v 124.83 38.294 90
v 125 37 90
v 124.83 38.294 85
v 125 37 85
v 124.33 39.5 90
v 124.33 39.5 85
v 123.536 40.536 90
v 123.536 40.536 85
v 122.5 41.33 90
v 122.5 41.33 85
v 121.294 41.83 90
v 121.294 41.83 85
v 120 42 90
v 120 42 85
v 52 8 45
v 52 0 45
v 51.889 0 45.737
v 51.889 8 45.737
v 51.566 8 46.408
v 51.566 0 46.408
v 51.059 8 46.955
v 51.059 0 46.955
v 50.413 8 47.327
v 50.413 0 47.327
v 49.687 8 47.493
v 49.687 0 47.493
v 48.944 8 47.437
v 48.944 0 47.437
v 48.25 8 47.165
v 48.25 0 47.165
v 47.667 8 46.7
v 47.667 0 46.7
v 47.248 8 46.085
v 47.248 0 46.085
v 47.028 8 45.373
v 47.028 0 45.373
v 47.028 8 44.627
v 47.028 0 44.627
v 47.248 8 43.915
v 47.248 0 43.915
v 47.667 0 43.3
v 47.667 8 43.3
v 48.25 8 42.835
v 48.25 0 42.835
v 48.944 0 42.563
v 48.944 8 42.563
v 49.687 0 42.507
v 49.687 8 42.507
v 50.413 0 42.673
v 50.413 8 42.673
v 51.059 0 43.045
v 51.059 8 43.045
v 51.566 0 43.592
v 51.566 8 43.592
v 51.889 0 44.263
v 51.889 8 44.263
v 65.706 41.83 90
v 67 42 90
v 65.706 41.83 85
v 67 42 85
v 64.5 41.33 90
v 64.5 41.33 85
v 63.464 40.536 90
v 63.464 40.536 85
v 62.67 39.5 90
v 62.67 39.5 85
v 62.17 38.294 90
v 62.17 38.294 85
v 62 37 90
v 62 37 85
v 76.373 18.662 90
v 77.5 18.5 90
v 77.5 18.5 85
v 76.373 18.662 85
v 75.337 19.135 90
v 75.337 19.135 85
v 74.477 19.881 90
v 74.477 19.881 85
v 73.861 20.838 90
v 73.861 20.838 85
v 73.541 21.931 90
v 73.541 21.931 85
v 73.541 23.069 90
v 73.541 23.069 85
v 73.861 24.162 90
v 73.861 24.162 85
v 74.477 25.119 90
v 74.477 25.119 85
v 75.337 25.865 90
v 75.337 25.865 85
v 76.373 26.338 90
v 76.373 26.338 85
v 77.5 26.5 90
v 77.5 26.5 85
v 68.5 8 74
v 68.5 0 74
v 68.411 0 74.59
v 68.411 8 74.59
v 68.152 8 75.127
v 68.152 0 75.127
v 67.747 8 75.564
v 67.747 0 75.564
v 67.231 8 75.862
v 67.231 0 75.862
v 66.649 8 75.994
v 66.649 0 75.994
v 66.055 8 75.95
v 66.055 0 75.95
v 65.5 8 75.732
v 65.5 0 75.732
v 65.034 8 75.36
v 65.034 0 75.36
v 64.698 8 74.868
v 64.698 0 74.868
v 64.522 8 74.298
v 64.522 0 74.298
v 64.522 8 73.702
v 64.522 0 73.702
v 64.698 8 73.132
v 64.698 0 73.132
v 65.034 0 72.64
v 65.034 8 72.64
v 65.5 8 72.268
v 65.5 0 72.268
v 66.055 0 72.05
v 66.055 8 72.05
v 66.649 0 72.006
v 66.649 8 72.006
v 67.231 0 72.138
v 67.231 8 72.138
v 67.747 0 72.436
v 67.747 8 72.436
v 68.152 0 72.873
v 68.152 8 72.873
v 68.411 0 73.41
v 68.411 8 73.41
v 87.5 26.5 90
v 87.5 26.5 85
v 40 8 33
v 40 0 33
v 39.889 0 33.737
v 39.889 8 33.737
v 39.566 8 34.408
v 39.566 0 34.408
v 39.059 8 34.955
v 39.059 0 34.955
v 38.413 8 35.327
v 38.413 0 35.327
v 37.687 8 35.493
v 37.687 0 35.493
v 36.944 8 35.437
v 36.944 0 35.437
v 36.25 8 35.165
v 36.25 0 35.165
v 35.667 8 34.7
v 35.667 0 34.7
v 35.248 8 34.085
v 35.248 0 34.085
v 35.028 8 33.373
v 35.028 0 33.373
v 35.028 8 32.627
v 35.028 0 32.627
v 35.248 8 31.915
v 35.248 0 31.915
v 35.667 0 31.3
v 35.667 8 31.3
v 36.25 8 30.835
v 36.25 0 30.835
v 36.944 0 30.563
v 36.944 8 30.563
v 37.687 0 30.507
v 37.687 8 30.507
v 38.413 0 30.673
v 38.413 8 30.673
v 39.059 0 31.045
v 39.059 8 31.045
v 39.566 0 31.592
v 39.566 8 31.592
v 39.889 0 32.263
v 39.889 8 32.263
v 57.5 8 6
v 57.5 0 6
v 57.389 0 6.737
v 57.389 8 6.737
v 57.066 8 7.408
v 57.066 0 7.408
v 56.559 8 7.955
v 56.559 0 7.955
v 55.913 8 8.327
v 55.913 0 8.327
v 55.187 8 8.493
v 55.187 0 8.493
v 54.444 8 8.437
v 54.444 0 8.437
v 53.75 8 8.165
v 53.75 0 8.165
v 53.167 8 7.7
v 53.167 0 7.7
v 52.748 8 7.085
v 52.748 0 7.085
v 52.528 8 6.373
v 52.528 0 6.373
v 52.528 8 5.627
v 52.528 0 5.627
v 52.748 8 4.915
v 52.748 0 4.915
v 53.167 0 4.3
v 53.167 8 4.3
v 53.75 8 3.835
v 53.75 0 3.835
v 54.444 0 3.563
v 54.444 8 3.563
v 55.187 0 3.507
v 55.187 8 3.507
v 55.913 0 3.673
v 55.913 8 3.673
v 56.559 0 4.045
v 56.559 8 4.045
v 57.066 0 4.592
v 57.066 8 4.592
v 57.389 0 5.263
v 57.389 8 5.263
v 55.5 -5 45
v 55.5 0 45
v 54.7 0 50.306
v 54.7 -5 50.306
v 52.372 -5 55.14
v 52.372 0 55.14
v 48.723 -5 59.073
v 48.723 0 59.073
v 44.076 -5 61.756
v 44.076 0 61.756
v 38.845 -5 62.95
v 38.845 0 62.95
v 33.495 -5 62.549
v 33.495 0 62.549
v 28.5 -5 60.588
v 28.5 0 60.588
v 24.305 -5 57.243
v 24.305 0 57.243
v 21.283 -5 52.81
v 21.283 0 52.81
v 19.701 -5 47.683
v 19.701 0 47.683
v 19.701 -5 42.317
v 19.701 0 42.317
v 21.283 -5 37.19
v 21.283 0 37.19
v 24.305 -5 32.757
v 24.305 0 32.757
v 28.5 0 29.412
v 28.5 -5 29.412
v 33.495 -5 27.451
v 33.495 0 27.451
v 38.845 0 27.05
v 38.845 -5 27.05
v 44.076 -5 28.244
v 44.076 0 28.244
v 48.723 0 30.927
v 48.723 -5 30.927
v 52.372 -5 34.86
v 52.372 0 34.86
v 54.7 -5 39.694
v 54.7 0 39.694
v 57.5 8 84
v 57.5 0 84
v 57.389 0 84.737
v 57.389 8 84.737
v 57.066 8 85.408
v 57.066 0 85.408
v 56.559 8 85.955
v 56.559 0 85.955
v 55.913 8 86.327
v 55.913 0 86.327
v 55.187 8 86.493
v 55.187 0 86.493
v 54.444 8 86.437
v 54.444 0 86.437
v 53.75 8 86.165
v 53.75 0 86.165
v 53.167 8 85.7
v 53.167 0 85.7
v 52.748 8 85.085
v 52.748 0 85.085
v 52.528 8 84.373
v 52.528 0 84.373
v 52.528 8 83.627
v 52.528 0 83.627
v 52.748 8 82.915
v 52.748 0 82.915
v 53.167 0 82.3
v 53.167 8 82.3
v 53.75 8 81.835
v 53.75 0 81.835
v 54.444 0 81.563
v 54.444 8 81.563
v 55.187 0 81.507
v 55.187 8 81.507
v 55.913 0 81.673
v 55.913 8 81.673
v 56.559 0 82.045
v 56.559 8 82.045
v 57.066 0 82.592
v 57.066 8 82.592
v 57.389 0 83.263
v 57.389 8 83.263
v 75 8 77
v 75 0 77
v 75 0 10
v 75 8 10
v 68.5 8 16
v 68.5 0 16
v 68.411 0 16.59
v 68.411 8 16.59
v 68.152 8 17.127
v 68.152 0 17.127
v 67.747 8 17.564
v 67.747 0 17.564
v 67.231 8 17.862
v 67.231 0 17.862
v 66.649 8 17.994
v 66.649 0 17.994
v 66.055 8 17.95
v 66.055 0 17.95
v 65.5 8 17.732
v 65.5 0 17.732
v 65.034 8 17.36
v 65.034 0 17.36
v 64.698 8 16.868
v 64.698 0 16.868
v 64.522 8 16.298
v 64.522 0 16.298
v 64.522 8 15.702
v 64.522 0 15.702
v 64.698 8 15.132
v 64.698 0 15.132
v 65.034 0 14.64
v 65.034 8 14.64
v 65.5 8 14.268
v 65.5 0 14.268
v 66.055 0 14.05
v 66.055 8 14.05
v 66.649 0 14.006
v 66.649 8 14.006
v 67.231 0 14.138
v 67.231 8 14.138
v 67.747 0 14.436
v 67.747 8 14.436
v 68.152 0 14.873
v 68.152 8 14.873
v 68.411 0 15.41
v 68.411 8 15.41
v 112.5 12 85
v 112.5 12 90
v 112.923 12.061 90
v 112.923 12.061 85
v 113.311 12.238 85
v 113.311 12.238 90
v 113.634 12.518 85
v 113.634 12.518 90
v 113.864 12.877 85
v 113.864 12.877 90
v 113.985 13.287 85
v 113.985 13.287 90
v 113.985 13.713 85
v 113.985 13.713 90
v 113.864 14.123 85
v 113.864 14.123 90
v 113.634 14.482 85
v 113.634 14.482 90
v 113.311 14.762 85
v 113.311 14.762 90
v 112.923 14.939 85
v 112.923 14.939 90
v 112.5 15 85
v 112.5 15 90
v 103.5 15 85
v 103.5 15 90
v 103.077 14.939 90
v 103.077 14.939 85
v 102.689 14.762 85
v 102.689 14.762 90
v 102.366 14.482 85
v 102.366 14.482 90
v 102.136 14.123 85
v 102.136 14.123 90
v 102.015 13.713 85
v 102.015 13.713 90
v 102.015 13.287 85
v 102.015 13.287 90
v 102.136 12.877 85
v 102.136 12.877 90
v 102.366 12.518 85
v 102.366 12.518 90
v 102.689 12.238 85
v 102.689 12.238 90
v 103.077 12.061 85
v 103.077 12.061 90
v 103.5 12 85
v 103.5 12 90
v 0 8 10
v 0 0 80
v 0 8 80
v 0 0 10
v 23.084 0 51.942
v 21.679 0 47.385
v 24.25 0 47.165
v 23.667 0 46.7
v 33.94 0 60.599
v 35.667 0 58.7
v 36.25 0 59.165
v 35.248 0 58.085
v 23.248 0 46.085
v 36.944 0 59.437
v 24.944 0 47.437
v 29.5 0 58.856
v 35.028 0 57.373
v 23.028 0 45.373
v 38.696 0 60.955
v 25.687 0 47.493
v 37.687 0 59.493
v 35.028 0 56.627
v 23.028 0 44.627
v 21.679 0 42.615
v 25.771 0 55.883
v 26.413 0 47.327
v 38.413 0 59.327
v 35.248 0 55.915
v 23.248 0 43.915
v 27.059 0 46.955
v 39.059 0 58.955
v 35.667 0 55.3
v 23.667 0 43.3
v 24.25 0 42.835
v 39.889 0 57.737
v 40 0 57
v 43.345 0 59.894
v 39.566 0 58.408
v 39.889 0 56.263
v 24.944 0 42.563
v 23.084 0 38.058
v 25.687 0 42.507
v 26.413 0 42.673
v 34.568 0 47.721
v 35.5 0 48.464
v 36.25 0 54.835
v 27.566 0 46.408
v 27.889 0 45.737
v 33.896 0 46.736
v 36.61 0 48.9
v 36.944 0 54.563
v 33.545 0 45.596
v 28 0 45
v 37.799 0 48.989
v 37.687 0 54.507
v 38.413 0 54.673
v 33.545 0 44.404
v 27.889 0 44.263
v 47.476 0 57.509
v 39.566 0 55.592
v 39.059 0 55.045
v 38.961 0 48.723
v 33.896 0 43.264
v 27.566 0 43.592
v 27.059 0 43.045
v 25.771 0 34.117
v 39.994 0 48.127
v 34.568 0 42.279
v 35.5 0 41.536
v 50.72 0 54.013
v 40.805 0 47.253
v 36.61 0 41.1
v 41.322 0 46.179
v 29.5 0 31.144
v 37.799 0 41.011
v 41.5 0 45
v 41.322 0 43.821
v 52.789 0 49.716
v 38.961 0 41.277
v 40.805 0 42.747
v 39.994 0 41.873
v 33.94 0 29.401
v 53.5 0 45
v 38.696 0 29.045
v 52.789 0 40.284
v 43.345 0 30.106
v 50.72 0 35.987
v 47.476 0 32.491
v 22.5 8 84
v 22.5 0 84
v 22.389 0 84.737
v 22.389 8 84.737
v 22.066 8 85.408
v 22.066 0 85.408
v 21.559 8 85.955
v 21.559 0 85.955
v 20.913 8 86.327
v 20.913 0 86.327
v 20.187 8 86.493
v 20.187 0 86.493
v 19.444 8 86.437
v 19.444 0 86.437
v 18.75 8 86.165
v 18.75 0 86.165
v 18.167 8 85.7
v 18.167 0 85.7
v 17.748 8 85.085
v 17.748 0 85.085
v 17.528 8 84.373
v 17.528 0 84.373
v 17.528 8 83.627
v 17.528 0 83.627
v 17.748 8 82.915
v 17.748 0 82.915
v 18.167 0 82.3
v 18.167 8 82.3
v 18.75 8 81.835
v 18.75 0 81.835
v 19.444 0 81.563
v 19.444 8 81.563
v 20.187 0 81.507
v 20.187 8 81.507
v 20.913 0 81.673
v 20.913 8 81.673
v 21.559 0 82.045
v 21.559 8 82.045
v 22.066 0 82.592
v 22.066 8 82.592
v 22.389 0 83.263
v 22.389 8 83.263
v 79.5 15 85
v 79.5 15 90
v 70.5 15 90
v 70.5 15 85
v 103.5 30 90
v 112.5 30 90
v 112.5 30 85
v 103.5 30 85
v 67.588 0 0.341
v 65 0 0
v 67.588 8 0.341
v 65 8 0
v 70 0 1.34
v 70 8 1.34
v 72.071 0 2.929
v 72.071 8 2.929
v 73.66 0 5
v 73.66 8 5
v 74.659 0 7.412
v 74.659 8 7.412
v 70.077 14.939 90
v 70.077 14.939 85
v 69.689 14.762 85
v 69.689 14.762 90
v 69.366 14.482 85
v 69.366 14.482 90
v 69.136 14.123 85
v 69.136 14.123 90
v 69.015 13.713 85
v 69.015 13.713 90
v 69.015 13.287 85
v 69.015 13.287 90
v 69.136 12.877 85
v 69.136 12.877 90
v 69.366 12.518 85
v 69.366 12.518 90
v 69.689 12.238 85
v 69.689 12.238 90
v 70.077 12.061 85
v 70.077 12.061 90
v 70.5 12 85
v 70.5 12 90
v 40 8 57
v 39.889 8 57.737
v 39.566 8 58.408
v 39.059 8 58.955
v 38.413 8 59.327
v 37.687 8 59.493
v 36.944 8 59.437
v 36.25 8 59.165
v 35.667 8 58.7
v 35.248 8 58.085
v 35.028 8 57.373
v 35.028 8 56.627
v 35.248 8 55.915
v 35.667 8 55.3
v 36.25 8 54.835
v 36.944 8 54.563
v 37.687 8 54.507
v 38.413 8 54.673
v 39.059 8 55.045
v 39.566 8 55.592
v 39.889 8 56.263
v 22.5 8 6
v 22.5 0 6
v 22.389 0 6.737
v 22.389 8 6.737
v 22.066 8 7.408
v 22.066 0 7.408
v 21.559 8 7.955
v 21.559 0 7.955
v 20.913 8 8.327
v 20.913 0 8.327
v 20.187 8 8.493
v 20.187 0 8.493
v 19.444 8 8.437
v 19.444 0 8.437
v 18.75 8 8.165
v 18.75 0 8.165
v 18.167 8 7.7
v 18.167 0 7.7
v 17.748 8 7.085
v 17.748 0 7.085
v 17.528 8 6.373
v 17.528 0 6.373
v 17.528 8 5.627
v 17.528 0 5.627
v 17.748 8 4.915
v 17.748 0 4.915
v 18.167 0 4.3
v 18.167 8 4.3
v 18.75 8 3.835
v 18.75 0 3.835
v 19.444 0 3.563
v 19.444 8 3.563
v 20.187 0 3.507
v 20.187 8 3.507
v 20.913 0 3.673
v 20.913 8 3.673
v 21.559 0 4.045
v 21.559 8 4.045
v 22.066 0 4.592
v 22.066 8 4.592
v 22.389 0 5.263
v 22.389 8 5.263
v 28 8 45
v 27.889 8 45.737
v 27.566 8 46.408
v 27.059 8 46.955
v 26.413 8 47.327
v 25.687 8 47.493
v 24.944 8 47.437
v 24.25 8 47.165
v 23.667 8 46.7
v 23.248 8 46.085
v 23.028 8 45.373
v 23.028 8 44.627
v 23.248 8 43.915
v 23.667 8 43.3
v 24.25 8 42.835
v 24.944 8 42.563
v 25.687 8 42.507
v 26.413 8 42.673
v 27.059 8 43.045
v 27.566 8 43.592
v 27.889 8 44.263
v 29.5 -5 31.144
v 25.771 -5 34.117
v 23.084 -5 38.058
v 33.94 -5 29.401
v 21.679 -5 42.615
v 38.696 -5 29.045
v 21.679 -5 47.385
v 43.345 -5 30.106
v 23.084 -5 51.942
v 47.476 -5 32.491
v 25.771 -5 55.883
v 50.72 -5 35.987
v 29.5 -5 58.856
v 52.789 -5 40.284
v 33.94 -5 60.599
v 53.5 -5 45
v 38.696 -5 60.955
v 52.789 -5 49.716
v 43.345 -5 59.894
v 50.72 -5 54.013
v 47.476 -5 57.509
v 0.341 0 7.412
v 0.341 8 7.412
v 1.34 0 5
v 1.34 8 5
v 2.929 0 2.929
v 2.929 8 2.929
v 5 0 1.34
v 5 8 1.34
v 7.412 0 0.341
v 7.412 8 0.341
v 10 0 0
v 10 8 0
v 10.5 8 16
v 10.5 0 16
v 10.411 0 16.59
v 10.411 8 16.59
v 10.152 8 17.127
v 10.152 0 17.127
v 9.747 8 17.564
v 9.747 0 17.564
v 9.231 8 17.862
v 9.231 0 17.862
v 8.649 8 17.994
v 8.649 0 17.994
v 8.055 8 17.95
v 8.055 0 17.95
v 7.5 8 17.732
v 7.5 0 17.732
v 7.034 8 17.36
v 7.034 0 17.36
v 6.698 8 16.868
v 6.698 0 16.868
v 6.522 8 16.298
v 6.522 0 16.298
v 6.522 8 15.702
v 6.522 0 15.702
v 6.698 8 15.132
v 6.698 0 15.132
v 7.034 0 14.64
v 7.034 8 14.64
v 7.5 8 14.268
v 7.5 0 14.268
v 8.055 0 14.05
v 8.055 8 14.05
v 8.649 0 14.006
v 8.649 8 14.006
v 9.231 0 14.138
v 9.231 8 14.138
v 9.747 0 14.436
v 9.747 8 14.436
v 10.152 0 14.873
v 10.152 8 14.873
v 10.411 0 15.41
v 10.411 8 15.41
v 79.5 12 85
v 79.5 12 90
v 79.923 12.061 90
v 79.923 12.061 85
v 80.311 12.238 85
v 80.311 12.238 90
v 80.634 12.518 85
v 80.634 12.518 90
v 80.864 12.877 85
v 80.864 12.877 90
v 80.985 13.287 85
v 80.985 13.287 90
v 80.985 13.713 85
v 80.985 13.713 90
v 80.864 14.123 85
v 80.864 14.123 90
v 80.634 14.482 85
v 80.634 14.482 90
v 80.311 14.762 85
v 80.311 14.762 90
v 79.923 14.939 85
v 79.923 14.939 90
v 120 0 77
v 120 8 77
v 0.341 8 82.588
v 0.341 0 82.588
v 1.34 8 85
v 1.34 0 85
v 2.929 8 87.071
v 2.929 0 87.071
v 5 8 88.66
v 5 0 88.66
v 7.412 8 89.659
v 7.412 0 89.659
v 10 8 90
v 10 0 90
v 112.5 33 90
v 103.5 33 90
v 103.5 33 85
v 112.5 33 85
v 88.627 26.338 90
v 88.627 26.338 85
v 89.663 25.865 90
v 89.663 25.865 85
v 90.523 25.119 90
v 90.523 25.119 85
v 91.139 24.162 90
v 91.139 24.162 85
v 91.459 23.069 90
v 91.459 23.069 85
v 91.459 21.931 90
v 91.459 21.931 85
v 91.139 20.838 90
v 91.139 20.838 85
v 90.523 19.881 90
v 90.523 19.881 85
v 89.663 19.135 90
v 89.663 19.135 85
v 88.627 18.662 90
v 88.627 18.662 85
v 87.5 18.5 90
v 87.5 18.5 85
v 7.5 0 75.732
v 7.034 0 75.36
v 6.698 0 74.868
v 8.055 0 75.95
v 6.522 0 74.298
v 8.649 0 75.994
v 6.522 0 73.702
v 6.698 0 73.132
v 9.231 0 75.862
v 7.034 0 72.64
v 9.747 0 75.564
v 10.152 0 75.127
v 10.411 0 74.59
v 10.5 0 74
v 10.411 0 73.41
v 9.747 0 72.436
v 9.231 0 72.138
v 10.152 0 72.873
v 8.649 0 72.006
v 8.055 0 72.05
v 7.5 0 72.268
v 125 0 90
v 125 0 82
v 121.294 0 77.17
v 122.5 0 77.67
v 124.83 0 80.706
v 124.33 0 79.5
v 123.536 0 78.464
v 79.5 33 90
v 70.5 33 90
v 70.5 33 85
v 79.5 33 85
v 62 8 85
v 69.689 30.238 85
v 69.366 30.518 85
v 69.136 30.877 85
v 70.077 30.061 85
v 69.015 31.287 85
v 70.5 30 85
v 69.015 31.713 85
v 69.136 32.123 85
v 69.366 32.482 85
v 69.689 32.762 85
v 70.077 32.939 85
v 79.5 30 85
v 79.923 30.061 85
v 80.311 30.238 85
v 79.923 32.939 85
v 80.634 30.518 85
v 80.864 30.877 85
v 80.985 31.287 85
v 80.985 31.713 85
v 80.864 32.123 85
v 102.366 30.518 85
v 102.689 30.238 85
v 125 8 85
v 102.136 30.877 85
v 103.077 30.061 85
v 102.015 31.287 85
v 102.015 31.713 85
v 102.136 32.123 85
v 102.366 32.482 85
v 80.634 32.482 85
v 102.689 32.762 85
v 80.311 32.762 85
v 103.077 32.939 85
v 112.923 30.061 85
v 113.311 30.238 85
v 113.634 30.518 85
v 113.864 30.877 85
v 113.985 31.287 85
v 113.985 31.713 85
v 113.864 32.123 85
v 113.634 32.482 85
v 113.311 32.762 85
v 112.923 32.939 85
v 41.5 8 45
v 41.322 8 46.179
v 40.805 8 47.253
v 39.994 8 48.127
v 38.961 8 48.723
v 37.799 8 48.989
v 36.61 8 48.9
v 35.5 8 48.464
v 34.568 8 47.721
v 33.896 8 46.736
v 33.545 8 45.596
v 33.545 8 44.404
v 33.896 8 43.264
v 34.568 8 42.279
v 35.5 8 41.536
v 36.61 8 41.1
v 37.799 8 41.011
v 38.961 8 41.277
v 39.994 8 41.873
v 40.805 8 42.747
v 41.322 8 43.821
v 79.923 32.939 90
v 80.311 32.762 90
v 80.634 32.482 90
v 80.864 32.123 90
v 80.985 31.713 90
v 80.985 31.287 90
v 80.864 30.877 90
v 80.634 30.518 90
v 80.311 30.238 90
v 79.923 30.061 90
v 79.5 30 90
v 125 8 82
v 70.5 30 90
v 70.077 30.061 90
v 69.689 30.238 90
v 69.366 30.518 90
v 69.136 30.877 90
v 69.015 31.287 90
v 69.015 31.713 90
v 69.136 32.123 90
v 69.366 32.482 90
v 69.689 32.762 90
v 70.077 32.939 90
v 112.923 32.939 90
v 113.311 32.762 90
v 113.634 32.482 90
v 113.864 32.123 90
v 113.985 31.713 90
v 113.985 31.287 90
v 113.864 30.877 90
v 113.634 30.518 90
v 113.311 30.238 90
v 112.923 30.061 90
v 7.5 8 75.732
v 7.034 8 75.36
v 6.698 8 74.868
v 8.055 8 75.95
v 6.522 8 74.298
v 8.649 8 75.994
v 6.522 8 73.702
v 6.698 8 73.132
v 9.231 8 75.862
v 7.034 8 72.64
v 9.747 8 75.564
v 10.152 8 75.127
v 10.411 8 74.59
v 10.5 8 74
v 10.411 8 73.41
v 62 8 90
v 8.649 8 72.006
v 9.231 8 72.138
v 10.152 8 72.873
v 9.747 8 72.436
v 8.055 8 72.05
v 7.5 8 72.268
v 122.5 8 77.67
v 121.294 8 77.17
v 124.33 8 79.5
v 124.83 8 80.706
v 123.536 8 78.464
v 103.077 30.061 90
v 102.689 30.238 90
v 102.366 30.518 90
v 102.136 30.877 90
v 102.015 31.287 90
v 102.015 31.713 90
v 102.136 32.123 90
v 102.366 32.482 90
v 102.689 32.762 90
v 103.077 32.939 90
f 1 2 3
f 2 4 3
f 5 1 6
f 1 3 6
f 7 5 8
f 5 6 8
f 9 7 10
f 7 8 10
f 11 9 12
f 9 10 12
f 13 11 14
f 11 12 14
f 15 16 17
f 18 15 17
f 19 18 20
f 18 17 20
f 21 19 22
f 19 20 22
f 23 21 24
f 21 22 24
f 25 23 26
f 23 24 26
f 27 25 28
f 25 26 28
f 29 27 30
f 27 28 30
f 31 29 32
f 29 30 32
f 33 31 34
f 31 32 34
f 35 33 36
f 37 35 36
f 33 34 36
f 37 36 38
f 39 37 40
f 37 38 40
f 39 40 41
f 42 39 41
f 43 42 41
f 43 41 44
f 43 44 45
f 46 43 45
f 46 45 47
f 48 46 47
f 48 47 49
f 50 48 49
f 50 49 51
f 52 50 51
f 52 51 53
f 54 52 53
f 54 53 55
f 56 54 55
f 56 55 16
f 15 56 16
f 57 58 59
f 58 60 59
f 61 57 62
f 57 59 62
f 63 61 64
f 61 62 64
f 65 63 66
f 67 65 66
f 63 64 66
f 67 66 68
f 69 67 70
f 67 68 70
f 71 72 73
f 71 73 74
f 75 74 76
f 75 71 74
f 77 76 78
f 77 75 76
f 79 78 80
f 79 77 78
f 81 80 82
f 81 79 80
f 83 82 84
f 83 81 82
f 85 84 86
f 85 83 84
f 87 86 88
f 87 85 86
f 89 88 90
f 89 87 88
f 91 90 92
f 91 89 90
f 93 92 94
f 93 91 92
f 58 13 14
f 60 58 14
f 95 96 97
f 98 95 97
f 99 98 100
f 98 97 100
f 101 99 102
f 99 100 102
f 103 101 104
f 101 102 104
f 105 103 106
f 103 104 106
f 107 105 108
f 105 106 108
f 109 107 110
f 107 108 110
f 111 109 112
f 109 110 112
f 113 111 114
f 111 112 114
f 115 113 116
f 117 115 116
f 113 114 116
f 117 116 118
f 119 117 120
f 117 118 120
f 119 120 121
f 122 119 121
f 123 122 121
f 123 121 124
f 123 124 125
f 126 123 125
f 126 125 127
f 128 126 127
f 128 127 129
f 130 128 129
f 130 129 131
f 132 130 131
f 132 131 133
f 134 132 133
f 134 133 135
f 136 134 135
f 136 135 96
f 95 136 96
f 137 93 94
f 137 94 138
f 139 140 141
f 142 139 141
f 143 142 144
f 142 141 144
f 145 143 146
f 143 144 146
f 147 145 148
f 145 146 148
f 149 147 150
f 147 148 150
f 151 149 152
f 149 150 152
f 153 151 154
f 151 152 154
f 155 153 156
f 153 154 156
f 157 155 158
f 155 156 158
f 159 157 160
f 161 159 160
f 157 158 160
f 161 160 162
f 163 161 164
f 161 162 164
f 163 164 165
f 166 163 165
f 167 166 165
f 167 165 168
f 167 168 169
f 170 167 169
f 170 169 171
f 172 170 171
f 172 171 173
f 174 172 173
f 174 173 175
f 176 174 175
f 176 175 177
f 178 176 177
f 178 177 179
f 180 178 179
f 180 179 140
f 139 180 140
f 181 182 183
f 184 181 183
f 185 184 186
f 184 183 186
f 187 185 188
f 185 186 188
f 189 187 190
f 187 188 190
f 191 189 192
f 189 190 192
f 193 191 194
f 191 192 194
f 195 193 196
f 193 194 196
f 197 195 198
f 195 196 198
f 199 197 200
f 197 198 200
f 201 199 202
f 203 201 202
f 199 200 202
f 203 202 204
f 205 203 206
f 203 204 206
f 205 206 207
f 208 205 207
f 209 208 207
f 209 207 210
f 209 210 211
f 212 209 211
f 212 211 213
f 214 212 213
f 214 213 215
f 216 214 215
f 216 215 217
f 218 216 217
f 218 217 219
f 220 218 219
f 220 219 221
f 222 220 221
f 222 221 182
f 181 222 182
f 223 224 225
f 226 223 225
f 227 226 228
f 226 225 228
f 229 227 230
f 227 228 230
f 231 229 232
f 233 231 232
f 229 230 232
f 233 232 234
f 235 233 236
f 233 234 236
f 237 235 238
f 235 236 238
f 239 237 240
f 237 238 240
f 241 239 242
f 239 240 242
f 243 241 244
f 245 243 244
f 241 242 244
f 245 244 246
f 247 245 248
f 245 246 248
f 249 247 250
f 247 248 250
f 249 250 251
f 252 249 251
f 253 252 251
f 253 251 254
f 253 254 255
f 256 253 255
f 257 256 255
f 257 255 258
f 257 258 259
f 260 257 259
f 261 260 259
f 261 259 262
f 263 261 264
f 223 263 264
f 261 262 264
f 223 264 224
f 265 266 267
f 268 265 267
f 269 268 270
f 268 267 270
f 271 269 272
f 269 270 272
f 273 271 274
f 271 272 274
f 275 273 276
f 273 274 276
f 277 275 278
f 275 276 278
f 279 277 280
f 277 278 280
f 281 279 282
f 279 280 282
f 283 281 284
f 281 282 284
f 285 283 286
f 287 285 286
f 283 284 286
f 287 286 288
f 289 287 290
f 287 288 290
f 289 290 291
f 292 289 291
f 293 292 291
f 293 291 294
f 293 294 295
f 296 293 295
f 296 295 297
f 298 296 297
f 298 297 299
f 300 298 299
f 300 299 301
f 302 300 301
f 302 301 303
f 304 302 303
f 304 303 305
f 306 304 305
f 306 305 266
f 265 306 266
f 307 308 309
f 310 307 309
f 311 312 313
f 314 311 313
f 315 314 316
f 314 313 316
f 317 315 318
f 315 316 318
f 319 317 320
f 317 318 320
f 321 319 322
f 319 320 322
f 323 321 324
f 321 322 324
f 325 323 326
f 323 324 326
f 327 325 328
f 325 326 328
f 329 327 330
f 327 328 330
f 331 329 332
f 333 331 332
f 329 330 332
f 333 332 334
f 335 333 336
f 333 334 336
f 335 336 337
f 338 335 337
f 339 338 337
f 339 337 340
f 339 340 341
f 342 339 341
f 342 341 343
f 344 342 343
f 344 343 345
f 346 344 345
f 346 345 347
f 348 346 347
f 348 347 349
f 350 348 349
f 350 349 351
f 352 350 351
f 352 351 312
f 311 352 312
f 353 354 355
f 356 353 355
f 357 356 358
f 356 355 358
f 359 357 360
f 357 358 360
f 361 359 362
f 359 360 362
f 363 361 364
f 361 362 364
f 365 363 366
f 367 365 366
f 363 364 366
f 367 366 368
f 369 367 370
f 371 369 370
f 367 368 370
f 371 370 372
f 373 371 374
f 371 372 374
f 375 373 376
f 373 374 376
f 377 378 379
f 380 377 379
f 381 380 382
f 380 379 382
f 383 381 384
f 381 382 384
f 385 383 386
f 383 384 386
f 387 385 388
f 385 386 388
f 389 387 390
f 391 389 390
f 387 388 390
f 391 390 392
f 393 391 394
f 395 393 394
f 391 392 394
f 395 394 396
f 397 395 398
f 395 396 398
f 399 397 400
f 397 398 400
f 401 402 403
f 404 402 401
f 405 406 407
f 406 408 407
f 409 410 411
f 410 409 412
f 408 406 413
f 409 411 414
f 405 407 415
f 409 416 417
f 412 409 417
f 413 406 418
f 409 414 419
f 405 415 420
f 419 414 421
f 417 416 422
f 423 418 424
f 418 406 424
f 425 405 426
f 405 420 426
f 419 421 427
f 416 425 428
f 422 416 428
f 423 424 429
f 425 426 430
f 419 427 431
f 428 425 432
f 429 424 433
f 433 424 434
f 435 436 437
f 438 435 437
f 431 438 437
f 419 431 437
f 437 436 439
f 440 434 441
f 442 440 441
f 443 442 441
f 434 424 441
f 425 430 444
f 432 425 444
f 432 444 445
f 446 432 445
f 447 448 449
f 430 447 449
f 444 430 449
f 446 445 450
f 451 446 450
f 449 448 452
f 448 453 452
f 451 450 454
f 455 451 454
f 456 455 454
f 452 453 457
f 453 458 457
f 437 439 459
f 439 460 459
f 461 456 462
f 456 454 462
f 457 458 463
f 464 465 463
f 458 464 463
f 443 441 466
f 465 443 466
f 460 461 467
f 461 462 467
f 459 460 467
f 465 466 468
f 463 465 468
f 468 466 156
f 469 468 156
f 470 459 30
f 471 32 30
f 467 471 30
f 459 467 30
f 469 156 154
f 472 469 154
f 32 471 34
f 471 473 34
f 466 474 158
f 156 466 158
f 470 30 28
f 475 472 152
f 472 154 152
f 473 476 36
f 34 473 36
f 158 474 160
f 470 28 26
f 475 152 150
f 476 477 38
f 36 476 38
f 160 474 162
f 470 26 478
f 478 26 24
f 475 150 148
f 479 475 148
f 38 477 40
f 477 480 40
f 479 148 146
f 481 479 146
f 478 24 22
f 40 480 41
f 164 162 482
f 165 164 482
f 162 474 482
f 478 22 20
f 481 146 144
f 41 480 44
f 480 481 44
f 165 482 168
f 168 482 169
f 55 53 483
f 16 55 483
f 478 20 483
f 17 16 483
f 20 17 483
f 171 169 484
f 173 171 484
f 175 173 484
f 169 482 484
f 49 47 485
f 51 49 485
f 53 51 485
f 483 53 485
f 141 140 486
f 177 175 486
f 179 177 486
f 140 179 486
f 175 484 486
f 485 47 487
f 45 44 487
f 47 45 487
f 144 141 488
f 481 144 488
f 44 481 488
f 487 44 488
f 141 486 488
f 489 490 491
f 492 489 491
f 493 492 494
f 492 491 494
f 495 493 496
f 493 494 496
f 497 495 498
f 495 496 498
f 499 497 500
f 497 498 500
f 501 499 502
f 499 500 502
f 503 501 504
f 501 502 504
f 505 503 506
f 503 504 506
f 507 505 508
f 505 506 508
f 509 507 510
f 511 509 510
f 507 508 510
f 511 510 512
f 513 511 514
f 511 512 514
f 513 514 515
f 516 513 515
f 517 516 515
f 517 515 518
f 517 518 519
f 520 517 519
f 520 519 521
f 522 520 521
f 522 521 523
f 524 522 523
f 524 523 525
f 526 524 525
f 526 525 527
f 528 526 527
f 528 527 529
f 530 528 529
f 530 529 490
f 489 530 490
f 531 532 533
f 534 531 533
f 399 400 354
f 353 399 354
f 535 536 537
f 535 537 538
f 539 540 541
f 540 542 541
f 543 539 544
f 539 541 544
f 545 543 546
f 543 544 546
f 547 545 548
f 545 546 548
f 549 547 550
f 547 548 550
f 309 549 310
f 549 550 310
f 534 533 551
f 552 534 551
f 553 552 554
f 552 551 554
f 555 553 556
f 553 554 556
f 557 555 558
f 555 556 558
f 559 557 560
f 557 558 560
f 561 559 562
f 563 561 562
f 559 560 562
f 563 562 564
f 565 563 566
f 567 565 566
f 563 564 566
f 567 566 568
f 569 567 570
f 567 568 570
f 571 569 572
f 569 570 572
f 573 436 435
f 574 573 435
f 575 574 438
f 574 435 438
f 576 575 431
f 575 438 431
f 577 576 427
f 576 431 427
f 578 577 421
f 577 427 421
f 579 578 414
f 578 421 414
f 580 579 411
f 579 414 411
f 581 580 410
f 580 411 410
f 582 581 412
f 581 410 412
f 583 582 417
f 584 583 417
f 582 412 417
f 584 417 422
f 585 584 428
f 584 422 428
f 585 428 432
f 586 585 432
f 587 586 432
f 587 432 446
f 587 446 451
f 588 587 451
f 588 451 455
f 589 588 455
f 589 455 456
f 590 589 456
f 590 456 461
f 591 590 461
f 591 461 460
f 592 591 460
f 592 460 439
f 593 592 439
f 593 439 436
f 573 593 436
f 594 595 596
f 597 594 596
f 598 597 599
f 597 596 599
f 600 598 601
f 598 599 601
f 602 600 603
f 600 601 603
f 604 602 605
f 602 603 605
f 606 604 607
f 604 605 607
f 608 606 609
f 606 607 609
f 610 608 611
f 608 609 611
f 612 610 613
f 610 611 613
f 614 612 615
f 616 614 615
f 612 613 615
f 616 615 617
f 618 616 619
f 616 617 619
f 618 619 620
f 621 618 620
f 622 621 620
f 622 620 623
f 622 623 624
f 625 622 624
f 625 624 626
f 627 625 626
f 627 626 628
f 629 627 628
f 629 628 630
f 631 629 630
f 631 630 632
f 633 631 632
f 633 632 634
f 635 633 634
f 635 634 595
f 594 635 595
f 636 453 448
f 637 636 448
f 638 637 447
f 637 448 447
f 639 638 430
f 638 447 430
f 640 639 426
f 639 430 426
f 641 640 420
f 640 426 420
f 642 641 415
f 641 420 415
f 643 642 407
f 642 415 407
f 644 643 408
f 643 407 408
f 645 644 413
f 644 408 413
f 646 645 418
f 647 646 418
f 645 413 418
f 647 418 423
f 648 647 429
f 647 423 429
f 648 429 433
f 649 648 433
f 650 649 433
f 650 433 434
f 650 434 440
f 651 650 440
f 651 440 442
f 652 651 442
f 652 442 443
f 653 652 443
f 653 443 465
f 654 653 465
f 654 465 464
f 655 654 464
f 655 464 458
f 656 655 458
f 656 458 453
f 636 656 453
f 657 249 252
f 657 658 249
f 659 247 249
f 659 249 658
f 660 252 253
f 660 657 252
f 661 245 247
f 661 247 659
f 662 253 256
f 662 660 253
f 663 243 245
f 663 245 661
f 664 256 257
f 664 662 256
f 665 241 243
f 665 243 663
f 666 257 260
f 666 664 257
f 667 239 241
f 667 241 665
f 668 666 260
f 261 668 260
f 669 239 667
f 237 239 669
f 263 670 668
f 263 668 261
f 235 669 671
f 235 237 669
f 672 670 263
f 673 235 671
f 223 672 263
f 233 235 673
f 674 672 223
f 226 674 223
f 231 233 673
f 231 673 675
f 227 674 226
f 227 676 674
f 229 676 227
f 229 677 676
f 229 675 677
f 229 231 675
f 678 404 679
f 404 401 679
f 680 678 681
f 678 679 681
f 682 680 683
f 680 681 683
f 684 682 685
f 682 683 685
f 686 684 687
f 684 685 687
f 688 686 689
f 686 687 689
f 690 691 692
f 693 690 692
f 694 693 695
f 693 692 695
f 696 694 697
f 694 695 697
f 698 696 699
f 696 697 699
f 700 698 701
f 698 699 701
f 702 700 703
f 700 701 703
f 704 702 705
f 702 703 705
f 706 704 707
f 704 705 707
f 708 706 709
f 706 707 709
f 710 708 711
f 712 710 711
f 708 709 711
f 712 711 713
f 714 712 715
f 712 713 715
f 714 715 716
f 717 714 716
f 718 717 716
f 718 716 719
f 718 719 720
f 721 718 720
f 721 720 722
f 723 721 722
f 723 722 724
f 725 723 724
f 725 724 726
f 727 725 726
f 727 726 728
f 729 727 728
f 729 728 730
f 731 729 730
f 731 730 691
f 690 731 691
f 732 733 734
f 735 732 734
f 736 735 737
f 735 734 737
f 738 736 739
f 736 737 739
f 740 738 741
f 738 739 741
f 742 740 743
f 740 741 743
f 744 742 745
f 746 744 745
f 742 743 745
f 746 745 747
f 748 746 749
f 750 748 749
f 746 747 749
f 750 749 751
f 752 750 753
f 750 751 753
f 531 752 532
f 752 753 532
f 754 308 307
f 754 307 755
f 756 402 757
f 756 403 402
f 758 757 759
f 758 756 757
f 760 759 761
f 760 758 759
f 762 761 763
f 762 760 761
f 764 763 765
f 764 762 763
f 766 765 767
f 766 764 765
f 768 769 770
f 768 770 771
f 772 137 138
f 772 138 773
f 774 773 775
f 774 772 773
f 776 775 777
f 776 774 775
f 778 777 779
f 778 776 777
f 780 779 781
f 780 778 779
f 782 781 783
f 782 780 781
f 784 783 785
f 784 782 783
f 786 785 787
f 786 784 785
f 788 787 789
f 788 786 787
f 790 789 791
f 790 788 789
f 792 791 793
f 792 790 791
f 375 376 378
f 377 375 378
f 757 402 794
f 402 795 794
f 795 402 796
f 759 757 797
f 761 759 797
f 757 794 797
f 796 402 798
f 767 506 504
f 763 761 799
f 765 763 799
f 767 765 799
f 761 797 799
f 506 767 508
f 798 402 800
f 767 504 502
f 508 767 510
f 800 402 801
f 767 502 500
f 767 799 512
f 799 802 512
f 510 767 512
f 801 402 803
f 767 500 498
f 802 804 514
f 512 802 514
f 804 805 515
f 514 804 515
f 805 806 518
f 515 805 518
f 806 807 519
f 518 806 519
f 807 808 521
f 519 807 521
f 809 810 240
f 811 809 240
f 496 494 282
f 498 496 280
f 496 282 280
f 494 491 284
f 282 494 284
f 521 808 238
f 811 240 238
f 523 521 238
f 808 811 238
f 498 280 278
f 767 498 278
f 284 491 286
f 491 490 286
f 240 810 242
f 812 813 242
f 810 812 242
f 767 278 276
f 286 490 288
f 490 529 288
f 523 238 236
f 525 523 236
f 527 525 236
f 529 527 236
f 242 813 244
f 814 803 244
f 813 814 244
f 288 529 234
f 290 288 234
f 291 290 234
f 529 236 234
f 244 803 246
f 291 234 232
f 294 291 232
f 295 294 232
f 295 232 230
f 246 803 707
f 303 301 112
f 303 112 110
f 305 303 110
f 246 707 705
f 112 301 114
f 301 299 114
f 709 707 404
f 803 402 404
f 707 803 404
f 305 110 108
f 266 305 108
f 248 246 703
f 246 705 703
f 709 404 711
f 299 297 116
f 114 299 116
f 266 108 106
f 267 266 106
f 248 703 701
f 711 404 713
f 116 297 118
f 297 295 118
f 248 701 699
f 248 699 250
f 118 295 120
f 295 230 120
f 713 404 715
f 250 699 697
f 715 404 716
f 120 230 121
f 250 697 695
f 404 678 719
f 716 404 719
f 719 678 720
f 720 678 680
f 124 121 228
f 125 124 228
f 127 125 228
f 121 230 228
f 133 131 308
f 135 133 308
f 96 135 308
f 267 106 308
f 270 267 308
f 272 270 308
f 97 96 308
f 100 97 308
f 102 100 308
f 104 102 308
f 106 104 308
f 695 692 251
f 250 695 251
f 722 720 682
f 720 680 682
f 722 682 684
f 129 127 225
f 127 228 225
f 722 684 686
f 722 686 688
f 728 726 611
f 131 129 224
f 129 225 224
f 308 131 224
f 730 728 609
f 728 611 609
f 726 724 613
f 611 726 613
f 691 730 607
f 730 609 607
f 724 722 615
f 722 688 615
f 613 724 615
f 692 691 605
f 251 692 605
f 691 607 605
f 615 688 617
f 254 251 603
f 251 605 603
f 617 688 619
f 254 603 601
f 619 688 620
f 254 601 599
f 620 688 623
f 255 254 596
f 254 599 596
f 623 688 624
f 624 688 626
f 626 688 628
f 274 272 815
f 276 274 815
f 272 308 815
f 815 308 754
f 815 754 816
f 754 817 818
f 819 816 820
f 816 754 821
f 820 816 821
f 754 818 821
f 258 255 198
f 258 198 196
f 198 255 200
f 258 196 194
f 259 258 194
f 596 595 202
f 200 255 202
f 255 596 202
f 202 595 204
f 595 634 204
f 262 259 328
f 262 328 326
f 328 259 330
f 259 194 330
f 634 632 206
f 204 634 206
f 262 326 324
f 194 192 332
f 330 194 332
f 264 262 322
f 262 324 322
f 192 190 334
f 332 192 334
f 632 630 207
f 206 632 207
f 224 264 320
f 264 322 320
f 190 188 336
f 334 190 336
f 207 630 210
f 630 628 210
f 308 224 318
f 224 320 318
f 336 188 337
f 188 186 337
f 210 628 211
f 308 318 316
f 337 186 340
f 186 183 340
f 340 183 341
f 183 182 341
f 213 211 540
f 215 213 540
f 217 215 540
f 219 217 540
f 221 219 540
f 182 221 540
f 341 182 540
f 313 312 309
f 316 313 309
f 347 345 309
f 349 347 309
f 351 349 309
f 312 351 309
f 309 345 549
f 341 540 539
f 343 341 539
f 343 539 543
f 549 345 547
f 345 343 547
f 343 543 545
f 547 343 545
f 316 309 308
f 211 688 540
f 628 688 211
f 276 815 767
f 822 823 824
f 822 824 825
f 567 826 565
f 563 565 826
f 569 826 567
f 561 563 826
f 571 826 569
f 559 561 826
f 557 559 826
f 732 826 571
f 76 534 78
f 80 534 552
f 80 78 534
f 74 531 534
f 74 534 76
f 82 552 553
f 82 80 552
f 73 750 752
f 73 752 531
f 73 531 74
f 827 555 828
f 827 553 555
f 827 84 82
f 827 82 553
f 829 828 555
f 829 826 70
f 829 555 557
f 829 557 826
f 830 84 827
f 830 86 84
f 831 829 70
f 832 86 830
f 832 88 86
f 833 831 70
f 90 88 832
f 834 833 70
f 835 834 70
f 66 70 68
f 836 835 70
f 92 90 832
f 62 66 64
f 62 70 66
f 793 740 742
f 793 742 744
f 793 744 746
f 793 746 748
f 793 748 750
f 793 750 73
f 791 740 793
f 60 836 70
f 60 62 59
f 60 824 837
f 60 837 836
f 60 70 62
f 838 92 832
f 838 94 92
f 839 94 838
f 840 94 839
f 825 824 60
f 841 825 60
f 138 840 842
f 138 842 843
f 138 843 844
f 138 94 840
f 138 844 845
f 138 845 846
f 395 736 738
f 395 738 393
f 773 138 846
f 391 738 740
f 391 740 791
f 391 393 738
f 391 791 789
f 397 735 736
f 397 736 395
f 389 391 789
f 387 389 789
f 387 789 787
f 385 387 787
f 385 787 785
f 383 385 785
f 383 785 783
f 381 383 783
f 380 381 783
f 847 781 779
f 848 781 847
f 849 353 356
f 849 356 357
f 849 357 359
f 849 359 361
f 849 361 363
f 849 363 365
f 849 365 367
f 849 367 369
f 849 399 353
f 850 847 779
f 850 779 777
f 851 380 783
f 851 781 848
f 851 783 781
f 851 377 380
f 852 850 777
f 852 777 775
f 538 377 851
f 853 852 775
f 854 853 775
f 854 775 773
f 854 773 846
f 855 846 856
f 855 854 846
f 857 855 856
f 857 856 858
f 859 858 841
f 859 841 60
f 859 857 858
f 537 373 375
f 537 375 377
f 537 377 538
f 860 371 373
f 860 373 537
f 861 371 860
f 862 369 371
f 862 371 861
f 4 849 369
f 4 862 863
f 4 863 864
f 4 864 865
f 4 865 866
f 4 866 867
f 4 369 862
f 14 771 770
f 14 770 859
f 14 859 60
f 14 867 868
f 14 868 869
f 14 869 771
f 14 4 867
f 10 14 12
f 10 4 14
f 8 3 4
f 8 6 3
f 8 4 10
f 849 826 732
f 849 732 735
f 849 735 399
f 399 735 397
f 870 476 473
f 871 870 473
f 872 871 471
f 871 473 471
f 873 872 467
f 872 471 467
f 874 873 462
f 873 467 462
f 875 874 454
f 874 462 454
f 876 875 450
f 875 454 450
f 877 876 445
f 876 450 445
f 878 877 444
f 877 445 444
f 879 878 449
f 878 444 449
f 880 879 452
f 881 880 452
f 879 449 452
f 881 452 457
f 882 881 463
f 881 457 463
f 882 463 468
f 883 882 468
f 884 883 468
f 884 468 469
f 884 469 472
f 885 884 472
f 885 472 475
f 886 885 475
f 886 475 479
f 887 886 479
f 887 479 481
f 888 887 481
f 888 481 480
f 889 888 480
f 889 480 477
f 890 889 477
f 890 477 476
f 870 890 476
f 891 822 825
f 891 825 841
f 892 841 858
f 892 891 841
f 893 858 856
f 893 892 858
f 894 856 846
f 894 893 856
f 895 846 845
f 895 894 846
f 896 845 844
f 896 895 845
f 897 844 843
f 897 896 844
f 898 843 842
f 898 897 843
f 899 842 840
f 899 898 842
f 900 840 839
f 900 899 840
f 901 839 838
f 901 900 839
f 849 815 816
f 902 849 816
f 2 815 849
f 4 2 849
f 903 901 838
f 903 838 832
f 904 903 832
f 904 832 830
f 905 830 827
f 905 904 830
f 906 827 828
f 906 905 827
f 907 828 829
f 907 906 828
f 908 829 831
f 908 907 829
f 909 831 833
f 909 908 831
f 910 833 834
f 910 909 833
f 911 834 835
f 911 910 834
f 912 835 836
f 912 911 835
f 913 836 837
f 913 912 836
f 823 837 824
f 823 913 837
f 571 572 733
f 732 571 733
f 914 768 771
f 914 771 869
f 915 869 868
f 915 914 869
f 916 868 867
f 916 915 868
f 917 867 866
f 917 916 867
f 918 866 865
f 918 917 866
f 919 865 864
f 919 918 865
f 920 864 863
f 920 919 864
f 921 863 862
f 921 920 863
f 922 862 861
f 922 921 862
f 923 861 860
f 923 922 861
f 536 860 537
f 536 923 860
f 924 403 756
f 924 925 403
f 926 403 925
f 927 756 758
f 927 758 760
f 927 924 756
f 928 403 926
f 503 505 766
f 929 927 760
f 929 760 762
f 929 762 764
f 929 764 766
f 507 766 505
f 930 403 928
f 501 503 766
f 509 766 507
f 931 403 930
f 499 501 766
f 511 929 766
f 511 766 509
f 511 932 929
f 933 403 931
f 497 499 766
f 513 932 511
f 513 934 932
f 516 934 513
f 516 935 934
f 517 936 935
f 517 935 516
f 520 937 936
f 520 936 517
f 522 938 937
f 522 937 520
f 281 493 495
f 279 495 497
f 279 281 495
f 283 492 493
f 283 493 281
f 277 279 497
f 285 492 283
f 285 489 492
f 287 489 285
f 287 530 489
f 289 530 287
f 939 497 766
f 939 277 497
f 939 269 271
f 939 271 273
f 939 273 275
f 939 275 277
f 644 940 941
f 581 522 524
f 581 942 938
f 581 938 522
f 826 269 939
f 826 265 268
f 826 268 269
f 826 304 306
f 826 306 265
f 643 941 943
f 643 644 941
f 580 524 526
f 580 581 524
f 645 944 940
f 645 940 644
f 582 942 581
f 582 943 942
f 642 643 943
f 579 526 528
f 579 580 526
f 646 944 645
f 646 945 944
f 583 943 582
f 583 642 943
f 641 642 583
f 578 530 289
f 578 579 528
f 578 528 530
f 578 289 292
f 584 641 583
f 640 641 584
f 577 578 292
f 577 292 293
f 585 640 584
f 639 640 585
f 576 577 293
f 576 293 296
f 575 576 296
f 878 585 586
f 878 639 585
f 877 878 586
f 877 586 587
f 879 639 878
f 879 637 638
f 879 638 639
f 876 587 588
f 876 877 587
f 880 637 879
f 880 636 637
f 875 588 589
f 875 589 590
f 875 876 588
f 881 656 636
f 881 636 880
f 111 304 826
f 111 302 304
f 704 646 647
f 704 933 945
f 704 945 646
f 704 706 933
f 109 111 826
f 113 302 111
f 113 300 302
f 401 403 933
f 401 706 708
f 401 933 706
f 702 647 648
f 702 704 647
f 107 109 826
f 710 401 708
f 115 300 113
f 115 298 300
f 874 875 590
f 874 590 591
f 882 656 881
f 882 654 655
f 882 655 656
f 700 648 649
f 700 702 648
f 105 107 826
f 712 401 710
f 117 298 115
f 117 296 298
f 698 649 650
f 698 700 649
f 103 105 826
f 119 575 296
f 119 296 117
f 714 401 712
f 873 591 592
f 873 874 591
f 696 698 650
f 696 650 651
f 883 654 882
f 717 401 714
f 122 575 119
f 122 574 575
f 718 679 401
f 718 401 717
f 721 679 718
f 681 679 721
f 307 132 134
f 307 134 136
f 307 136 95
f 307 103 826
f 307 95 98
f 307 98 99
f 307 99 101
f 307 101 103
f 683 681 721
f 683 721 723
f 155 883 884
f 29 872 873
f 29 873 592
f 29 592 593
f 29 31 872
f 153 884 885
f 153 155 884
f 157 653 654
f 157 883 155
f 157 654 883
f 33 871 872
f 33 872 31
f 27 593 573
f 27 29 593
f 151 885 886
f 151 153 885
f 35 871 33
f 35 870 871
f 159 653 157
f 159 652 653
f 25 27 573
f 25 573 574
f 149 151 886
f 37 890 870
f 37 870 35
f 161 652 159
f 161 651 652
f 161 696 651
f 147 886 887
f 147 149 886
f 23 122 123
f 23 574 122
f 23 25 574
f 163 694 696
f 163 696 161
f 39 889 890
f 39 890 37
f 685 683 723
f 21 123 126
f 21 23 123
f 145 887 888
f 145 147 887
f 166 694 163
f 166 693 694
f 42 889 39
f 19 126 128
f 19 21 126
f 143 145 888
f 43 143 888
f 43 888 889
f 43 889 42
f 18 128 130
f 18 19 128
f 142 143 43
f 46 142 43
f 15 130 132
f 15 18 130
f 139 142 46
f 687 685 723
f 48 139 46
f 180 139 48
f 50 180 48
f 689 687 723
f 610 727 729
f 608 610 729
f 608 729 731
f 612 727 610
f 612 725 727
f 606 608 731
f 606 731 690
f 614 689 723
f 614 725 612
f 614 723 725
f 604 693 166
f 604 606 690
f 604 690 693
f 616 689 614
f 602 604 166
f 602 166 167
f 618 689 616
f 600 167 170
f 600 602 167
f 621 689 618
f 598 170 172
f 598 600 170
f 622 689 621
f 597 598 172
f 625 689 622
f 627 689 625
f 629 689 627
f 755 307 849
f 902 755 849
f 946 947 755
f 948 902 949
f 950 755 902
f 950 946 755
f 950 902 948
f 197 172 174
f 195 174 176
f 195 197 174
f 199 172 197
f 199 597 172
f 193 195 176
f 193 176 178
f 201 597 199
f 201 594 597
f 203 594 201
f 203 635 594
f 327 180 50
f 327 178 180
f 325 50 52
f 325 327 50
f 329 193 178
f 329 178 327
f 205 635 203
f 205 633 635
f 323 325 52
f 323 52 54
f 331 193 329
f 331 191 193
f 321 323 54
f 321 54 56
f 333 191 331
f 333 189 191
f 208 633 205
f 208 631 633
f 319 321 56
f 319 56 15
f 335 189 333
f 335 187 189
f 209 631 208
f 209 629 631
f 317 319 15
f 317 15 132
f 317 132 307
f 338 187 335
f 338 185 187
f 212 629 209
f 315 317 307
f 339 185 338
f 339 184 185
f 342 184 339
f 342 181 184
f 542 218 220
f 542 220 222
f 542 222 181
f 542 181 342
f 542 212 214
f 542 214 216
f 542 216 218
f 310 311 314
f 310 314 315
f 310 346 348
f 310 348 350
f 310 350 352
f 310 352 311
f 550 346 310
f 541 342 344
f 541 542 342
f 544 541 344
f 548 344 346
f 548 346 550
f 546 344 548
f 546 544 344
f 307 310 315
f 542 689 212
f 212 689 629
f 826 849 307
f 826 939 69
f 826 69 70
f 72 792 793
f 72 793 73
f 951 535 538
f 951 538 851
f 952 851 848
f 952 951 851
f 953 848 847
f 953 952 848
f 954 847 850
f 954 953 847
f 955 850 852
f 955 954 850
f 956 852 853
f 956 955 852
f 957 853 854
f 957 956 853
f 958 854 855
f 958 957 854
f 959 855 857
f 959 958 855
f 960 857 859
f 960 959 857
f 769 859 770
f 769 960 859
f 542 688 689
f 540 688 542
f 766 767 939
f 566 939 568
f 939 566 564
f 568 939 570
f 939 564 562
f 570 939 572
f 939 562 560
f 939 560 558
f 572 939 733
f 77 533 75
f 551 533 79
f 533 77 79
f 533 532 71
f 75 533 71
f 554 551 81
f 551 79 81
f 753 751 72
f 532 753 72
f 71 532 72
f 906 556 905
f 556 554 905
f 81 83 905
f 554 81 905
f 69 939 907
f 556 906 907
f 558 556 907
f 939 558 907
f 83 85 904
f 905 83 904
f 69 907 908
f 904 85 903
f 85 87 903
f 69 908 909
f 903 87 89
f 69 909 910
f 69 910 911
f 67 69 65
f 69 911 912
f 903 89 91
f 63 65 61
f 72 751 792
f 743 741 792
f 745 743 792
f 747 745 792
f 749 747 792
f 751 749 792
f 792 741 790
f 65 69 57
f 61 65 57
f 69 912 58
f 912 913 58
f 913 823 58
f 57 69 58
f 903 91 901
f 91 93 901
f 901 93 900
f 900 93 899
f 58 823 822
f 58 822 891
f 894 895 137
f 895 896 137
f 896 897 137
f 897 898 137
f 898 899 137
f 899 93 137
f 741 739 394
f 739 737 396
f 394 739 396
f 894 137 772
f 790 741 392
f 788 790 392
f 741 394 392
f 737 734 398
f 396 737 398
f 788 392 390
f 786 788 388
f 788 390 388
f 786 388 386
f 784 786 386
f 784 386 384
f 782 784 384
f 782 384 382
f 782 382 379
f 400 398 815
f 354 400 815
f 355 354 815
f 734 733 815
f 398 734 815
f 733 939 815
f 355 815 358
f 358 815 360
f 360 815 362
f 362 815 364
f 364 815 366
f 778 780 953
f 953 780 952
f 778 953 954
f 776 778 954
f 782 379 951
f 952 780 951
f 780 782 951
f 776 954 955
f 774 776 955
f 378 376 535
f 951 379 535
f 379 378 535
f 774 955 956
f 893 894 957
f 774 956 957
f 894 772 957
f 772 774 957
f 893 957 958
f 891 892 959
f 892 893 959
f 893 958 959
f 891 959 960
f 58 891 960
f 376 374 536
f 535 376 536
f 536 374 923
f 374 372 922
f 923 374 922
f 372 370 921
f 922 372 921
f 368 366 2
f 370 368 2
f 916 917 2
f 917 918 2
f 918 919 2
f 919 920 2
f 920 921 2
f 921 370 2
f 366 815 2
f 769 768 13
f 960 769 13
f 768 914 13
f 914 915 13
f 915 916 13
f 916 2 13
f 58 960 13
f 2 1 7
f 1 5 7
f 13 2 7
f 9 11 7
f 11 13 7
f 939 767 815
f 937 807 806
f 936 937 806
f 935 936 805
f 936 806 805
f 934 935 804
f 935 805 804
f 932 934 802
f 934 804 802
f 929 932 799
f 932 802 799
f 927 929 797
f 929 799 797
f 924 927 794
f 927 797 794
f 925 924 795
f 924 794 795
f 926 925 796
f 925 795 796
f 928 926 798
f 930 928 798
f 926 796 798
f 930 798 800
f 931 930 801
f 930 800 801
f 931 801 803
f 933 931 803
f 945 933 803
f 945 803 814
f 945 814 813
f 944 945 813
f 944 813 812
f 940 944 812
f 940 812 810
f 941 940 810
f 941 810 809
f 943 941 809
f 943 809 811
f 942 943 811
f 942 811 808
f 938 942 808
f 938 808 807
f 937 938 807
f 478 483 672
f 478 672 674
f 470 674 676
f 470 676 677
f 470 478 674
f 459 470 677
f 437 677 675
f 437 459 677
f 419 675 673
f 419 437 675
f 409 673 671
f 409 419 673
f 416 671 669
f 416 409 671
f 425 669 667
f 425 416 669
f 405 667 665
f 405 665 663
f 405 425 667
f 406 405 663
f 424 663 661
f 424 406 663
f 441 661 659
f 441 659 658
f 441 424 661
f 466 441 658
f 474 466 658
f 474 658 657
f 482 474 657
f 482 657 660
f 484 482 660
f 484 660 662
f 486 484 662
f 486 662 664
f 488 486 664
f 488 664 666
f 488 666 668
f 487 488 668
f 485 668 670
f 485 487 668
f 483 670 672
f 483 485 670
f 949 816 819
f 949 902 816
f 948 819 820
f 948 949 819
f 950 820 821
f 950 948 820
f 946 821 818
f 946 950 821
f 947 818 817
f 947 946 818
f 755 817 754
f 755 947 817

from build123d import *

# Parameters (mm, degrees)
SKETCH1_W               = 75
SKETCH1_H               = 90
SKETCH1_W_2             = 50
SKETCH1_H_2             = 13
BOSS_EXTRUDE1_DEPTH     = 8
SKETCH2_R               = 18
SKETCH2_R_2             = 16
BOSS_EXTRUDE2_DEPTH     = 5
SKETCH3_R               = 2
CUT_EXTRUDE2_DEPTH      = 6
CUT_EXTRUDE2_DEPTH_BACK = 9
FILLET2_R               = 10
FILLET3_R               = 10
FILLET4_R               = 10
CUT_EXTRUDE3_REACH      = 10
SKETCH5_R               = 2.5
SKETCH7_W               = 5
SKETCH7_H               = 34
BOSS_EXTRUDE3_DEPTH     = 63
FILLET5_R               = 5
FILLET6_R               = 5
FILLET7_R               = 5
CUT_EXTRUDE4_REACH      = 92
CUT_EXTRUDE5_REACH      = 44
SKETCH14_R              = 2.5
SKETCH14_R_2            = 4


with BuildPart() as part:
    # Sketch1 → Boss-Extrude1 (new body)
    with BuildSketch(Plane(origin=(0, 0, 0), x_dir=(1, 0, 0), z_dir=(0, 1, 0))):
        with Locations((37.5, -45)):
            Rectangle(SKETCH1_W, SKETCH1_H)
        with Locations((100, -83.5)):
            Rectangle(SKETCH1_W_2, SKETCH1_H_2)
    extrude(amount=BOSS_EXTRUDE1_DEPTH)

    # Sketch2 → Boss-Extrude2 (add)
    with BuildSketch(Plane.XZ):
        with Locations((37.5, 45)):
            Circle(SKETCH2_R)
        with Locations((37.5, 45)):
            Circle(SKETCH2_R_2, mode=Mode.SUBTRACT)
    extrude(amount=BOSS_EXTRUDE2_DEPTH)

    # Sketch3 → Cut-Extrude2 (cut, two sides)
    with BuildSketch(Plane.XZ) as cut_extrude2_sk:
        with Locations((8.5, 74)):
            Circle(SKETCH3_R)
        with Locations((66.5, 74)):
            Circle(SKETCH3_R)
        with Locations((8.5, 16)):
            Circle(SKETCH3_R)
        with Locations((66.5, 16)):
            Circle(SKETCH3_R)
    extrude(amount=CUT_EXTRUDE2_DEPTH, mode=Mode.SUBTRACT)
    extrude(cut_extrude2_sk.sketch, amount=-CUT_EXTRUDE2_DEPTH_BACK, mode=Mode.SUBTRACT)

    # Fillet2
    fillet2_edges = [part.edges().sort_by_distance(p)[0] for p in [
        (0, 4, 0),
    ]]
    fillet(fillet2_edges, radius=FILLET2_R)

    # Fillet3
    fillet3_edges = [part.edges().sort_by_distance(p)[0] for p in [
        (0, 4, 90),
    ]]
    fillet(fillet3_edges, radius=FILLET3_R)

    # Fillet4
    fillet4_edges = [part.edges().sort_by_distance(p)[0] for p in [
        (75, 4, 0),
    ]]
    fillet(fillet4_edges, radius=FILLET4_R)

    # Sketch5 → Cut-Extrude3 (cut, up to next)
    with BuildSketch(Plane.XZ, mode=Mode.PRIVATE) as cut_extrude3_sk1:
        with Locations((55, 6)):
            Circle(SKETCH5_R)
    cut_extrude3_tool1 = extrude(cut_extrude3_sk1.sketch, amount=-CUT_EXTRUDE3_REACH, mode=Mode.PRIVATE) & part.part
    add(cut_extrude3_tool1.solids().sort_by_distance((55, 0, 6))[0], mode=Mode.SUBTRACT)
    # Sketch5 → Cut-Extrude3 (cut, up to next)
    with BuildSketch(Plane.XZ, mode=Mode.PRIVATE) as cut_extrude3_sk2:
        with Locations((20, 84)):
            Circle(SKETCH5_R)
    cut_extrude3_tool2 = extrude(cut_extrude3_sk2.sketch, amount=-CUT_EXTRUDE3_REACH, mode=Mode.PRIVATE) & part.part
    add(cut_extrude3_tool2.solids().sort_by_distance((20, 0, 84))[0], mode=Mode.SUBTRACT)
    # Sketch5 → Cut-Extrude3 (cut, up to next)
    with BuildSketch(Plane.XZ, mode=Mode.PRIVATE) as cut_extrude3_sk3:
        with Locations((55, 84)):
            Circle(SKETCH5_R)
    cut_extrude3_tool3 = extrude(cut_extrude3_sk3.sketch, amount=-CUT_EXTRUDE3_REACH, mode=Mode.PRIVATE) & part.part
    add(cut_extrude3_tool3.solids().sort_by_distance((55, 0, 84))[0], mode=Mode.SUBTRACT)
    # Sketch5 → Cut-Extrude3 (cut, up to next)
    with BuildSketch(Plane.XZ, mode=Mode.PRIVATE) as cut_extrude3_sk4:
        with Locations((20, 6)):
            Circle(SKETCH5_R)
    cut_extrude3_tool4 = extrude(cut_extrude3_sk4.sketch, amount=-CUT_EXTRUDE3_REACH, mode=Mode.PRIVATE) & part.part
    add(cut_extrude3_tool4.solids().sort_by_distance((20, 0, 6))[0], mode=Mode.SUBTRACT)

    # Sketch7 → Boss-Extrude3 (add)
    with BuildSketch(Plane(origin=(125, 0, 0), x_dir=(0, 0, -1), z_dir=(1, 0, 0))):
        with Locations((-87.5, 25)):
            Rectangle(SKETCH7_W, SKETCH7_H)
    extrude(amount=-BOSS_EXTRUDE3_DEPTH)

    # Fillet5
    fillet5_edges = [part.edges().sort_by_distance(p)[0] for p in [
        (125, 42, 87.5),
    ]]
    fillet(fillet5_edges, radius=FILLET5_R)

    # Fillet6
    fillet6_edges = [part.edges().sort_by_distance(p)[0] for p in [
        (125, 4, 77),
    ]]
    fillet(fillet6_edges, radius=FILLET6_R)

    # Fillet7
    fillet7_edges = [part.edges().sort_by_distance(p)[0] for p in [
        (62, 42, 87.5),
    ]]
    fillet(fillet7_edges, radius=FILLET7_R)

    # Sketch12 → Cut-Extrude4 (cut, up to next)
    with BuildSketch(Plane.XY.offset(90), mode=Mode.PRIVATE) as cut_extrude4_sk1:
        with BuildLine():
            Line((77.5, 26.5), (87.5, 26.5))
            ThreePointArc((87.5, 26.5), (91.5, 22.5), (87.5, 18.5))
            Line((87.5, 18.5), (77.5, 18.5))
            ThreePointArc((77.5, 18.5), (73.5, 22.5), (77.5, 26.5))
        make_face()
    cut_extrude4_tool1 = extrude(cut_extrude4_sk1.sketch, amount=-CUT_EXTRUDE4_REACH, mode=Mode.PRIVATE) & part.part
    add(cut_extrude4_tool1.solids().sort_by_distance((82.5, 22.5, 90))[0], mode=Mode.SUBTRACT)
    # Sketch12 → Cut-Extrude4 (cut, up to next)
    with BuildSketch(Plane.XY.offset(90), mode=Mode.PRIVATE) as cut_extrude4_sk2:
        with BuildLine():
            Line((70.5, 33), (79.5, 33))
            ThreePointArc((79.5, 33), (81, 31.5), (79.5, 30))
            Line((79.5, 30), (70.5, 30))
            ThreePointArc((70.5, 30), (69, 31.5), (70.5, 33))
        make_face()
    cut_extrude4_tool2 = extrude(cut_extrude4_sk2.sketch, amount=-CUT_EXTRUDE4_REACH, mode=Mode.PRIVATE) & part.part
    add(cut_extrude4_tool2.solids().sort_by_distance((75, 31.5, 90))[0], mode=Mode.SUBTRACT)
    # Sketch12 → Cut-Extrude4 (cut, up to next)
    with BuildSketch(Plane.XY.offset(90), mode=Mode.PRIVATE) as cut_extrude4_sk3:
        with BuildLine():
            Line((70.5, 12), (79.5, 12))
            ThreePointArc((79.5, 12), (81, 13.5), (79.5, 15))
            Line((79.5, 15), (70.5, 15))
            ThreePointArc((70.5, 15), (69, 13.5), (70.5, 12))
        make_face()
    cut_extrude4_tool3 = extrude(cut_extrude4_sk3.sketch, amount=-CUT_EXTRUDE4_REACH, mode=Mode.PRIVATE) & part.part
    add(cut_extrude4_tool3.solids().sort_by_distance((75, 13.5, 90))[0], mode=Mode.SUBTRACT)
    # Sketch12 → Cut-Extrude4 (cut, up to next)
    with BuildSketch(Plane.XY.offset(90), mode=Mode.PRIVATE) as cut_extrude4_sk4:
        with BuildLine():
            Line((103.5, 33), (112.5, 33))
            ThreePointArc((112.5, 33), (114, 31.5), (112.5, 30))
            Line((112.5, 30), (103.5, 30))
            ThreePointArc((103.5, 30), (102, 31.5), (103.5, 33))
        make_face()
    cut_extrude4_tool4 = extrude(cut_extrude4_sk4.sketch, amount=-CUT_EXTRUDE4_REACH, mode=Mode.PRIVATE) & part.part
    add(cut_extrude4_tool4.solids().sort_by_distance((108, 31.5, 90))[0], mode=Mode.SUBTRACT)
    # Sketch12 → Cut-Extrude4 (cut, up to next)
    with BuildSketch(Plane.XY.offset(90), mode=Mode.PRIVATE) as cut_extrude4_sk5:
        with BuildLine():
            Line((103.5, 12), (112.5, 12))
            ThreePointArc((112.5, 12), (114, 13.5), (112.5, 15))
            Line((112.5, 15), (103.5, 15))
            ThreePointArc((103.5, 15), (102, 13.5), (103.5, 12))
        make_face()
    cut_extrude4_tool5 = extrude(cut_extrude4_sk5.sketch, amount=-CUT_EXTRUDE4_REACH, mode=Mode.PRIVATE) & part.part
    add(cut_extrude4_tool5.solids().sort_by_distance((108, 13.5, 90))[0], mode=Mode.SUBTRACT)

    # Sketch14 → Cut-Extrude5 (cut, up to next)
    with BuildSketch(Plane.XZ, mode=Mode.PRIVATE) as cut_extrude5_sk1:
        with Locations((37.5, 57)):
            Circle(SKETCH14_R)
    cut_extrude5_tool1 = extrude(cut_extrude5_sk1.sketch, amount=-CUT_EXTRUDE5_REACH, mode=Mode.PRIVATE) & part.part
    add(cut_extrude5_tool1.solids().sort_by_distance((37.5, 0, 57))[0], mode=Mode.SUBTRACT)
    # Sketch14 → Cut-Extrude5 (cut, up to next)
    with BuildSketch(Plane.XZ, mode=Mode.PRIVATE) as cut_extrude5_sk2:
        with Locations((37.5, 45)):
            Circle(SKETCH14_R_2)
    cut_extrude5_tool2 = extrude(cut_extrude5_sk2.sketch, amount=-CUT_EXTRUDE5_REACH, mode=Mode.PRIVATE) & part.part
    add(cut_extrude5_tool2.solids().sort_by_distance((37.5, 0, 45))[0], mode=Mode.SUBTRACT)
    # Sketch14 → Cut-Extrude5 (cut, up to next)
    with BuildSketch(Plane.XZ, mode=Mode.PRIVATE) as cut_extrude5_sk3:
        with Locations((49.5, 45)):
            Circle(SKETCH14_R)
    cut_extrude5_tool3 = extrude(cut_extrude5_sk3.sketch, amount=-CUT_EXTRUDE5_REACH, mode=Mode.PRIVATE) & part.part
    add(cut_extrude5_tool3.solids().sort_by_distance((49.5, 0, 45))[0], mode=Mode.SUBTRACT)
    # Sketch14 → Cut-Extrude5 (cut, up to next)
    with BuildSketch(Plane.XZ, mode=Mode.PRIVATE) as cut_extrude5_sk4:
        with Locations((37.5, 33)):
            Circle(SKETCH14_R)
    cut_extrude5_tool4 = extrude(cut_extrude5_sk4.sketch, amount=-CUT_EXTRUDE5_REACH, mode=Mode.PRIVATE) & part.part
    add(cut_extrude5_tool4.solids().sort_by_distance((37.5, 0, 33))[0], mode=Mode.SUBTRACT)
    # Sketch14 → Cut-Extrude5 (cut, up to next)
    with BuildSketch(Plane.XZ, mode=Mode.PRIVATE) as cut_extrude5_sk5:
        with Locations((25.5, 45)):
            Circle(SKETCH14_R)
    cut_extrude5_tool5 = extrude(cut_extrude5_sk5.sketch, amount=-CUT_EXTRUDE5_REACH, mode=Mode.PRIVATE) & part.part
    add(cut_extrude5_tool5.solids().sort_by_distance((25.5, 0, 45))[0], mode=Mode.SUBTRACT)


solid = part.part
